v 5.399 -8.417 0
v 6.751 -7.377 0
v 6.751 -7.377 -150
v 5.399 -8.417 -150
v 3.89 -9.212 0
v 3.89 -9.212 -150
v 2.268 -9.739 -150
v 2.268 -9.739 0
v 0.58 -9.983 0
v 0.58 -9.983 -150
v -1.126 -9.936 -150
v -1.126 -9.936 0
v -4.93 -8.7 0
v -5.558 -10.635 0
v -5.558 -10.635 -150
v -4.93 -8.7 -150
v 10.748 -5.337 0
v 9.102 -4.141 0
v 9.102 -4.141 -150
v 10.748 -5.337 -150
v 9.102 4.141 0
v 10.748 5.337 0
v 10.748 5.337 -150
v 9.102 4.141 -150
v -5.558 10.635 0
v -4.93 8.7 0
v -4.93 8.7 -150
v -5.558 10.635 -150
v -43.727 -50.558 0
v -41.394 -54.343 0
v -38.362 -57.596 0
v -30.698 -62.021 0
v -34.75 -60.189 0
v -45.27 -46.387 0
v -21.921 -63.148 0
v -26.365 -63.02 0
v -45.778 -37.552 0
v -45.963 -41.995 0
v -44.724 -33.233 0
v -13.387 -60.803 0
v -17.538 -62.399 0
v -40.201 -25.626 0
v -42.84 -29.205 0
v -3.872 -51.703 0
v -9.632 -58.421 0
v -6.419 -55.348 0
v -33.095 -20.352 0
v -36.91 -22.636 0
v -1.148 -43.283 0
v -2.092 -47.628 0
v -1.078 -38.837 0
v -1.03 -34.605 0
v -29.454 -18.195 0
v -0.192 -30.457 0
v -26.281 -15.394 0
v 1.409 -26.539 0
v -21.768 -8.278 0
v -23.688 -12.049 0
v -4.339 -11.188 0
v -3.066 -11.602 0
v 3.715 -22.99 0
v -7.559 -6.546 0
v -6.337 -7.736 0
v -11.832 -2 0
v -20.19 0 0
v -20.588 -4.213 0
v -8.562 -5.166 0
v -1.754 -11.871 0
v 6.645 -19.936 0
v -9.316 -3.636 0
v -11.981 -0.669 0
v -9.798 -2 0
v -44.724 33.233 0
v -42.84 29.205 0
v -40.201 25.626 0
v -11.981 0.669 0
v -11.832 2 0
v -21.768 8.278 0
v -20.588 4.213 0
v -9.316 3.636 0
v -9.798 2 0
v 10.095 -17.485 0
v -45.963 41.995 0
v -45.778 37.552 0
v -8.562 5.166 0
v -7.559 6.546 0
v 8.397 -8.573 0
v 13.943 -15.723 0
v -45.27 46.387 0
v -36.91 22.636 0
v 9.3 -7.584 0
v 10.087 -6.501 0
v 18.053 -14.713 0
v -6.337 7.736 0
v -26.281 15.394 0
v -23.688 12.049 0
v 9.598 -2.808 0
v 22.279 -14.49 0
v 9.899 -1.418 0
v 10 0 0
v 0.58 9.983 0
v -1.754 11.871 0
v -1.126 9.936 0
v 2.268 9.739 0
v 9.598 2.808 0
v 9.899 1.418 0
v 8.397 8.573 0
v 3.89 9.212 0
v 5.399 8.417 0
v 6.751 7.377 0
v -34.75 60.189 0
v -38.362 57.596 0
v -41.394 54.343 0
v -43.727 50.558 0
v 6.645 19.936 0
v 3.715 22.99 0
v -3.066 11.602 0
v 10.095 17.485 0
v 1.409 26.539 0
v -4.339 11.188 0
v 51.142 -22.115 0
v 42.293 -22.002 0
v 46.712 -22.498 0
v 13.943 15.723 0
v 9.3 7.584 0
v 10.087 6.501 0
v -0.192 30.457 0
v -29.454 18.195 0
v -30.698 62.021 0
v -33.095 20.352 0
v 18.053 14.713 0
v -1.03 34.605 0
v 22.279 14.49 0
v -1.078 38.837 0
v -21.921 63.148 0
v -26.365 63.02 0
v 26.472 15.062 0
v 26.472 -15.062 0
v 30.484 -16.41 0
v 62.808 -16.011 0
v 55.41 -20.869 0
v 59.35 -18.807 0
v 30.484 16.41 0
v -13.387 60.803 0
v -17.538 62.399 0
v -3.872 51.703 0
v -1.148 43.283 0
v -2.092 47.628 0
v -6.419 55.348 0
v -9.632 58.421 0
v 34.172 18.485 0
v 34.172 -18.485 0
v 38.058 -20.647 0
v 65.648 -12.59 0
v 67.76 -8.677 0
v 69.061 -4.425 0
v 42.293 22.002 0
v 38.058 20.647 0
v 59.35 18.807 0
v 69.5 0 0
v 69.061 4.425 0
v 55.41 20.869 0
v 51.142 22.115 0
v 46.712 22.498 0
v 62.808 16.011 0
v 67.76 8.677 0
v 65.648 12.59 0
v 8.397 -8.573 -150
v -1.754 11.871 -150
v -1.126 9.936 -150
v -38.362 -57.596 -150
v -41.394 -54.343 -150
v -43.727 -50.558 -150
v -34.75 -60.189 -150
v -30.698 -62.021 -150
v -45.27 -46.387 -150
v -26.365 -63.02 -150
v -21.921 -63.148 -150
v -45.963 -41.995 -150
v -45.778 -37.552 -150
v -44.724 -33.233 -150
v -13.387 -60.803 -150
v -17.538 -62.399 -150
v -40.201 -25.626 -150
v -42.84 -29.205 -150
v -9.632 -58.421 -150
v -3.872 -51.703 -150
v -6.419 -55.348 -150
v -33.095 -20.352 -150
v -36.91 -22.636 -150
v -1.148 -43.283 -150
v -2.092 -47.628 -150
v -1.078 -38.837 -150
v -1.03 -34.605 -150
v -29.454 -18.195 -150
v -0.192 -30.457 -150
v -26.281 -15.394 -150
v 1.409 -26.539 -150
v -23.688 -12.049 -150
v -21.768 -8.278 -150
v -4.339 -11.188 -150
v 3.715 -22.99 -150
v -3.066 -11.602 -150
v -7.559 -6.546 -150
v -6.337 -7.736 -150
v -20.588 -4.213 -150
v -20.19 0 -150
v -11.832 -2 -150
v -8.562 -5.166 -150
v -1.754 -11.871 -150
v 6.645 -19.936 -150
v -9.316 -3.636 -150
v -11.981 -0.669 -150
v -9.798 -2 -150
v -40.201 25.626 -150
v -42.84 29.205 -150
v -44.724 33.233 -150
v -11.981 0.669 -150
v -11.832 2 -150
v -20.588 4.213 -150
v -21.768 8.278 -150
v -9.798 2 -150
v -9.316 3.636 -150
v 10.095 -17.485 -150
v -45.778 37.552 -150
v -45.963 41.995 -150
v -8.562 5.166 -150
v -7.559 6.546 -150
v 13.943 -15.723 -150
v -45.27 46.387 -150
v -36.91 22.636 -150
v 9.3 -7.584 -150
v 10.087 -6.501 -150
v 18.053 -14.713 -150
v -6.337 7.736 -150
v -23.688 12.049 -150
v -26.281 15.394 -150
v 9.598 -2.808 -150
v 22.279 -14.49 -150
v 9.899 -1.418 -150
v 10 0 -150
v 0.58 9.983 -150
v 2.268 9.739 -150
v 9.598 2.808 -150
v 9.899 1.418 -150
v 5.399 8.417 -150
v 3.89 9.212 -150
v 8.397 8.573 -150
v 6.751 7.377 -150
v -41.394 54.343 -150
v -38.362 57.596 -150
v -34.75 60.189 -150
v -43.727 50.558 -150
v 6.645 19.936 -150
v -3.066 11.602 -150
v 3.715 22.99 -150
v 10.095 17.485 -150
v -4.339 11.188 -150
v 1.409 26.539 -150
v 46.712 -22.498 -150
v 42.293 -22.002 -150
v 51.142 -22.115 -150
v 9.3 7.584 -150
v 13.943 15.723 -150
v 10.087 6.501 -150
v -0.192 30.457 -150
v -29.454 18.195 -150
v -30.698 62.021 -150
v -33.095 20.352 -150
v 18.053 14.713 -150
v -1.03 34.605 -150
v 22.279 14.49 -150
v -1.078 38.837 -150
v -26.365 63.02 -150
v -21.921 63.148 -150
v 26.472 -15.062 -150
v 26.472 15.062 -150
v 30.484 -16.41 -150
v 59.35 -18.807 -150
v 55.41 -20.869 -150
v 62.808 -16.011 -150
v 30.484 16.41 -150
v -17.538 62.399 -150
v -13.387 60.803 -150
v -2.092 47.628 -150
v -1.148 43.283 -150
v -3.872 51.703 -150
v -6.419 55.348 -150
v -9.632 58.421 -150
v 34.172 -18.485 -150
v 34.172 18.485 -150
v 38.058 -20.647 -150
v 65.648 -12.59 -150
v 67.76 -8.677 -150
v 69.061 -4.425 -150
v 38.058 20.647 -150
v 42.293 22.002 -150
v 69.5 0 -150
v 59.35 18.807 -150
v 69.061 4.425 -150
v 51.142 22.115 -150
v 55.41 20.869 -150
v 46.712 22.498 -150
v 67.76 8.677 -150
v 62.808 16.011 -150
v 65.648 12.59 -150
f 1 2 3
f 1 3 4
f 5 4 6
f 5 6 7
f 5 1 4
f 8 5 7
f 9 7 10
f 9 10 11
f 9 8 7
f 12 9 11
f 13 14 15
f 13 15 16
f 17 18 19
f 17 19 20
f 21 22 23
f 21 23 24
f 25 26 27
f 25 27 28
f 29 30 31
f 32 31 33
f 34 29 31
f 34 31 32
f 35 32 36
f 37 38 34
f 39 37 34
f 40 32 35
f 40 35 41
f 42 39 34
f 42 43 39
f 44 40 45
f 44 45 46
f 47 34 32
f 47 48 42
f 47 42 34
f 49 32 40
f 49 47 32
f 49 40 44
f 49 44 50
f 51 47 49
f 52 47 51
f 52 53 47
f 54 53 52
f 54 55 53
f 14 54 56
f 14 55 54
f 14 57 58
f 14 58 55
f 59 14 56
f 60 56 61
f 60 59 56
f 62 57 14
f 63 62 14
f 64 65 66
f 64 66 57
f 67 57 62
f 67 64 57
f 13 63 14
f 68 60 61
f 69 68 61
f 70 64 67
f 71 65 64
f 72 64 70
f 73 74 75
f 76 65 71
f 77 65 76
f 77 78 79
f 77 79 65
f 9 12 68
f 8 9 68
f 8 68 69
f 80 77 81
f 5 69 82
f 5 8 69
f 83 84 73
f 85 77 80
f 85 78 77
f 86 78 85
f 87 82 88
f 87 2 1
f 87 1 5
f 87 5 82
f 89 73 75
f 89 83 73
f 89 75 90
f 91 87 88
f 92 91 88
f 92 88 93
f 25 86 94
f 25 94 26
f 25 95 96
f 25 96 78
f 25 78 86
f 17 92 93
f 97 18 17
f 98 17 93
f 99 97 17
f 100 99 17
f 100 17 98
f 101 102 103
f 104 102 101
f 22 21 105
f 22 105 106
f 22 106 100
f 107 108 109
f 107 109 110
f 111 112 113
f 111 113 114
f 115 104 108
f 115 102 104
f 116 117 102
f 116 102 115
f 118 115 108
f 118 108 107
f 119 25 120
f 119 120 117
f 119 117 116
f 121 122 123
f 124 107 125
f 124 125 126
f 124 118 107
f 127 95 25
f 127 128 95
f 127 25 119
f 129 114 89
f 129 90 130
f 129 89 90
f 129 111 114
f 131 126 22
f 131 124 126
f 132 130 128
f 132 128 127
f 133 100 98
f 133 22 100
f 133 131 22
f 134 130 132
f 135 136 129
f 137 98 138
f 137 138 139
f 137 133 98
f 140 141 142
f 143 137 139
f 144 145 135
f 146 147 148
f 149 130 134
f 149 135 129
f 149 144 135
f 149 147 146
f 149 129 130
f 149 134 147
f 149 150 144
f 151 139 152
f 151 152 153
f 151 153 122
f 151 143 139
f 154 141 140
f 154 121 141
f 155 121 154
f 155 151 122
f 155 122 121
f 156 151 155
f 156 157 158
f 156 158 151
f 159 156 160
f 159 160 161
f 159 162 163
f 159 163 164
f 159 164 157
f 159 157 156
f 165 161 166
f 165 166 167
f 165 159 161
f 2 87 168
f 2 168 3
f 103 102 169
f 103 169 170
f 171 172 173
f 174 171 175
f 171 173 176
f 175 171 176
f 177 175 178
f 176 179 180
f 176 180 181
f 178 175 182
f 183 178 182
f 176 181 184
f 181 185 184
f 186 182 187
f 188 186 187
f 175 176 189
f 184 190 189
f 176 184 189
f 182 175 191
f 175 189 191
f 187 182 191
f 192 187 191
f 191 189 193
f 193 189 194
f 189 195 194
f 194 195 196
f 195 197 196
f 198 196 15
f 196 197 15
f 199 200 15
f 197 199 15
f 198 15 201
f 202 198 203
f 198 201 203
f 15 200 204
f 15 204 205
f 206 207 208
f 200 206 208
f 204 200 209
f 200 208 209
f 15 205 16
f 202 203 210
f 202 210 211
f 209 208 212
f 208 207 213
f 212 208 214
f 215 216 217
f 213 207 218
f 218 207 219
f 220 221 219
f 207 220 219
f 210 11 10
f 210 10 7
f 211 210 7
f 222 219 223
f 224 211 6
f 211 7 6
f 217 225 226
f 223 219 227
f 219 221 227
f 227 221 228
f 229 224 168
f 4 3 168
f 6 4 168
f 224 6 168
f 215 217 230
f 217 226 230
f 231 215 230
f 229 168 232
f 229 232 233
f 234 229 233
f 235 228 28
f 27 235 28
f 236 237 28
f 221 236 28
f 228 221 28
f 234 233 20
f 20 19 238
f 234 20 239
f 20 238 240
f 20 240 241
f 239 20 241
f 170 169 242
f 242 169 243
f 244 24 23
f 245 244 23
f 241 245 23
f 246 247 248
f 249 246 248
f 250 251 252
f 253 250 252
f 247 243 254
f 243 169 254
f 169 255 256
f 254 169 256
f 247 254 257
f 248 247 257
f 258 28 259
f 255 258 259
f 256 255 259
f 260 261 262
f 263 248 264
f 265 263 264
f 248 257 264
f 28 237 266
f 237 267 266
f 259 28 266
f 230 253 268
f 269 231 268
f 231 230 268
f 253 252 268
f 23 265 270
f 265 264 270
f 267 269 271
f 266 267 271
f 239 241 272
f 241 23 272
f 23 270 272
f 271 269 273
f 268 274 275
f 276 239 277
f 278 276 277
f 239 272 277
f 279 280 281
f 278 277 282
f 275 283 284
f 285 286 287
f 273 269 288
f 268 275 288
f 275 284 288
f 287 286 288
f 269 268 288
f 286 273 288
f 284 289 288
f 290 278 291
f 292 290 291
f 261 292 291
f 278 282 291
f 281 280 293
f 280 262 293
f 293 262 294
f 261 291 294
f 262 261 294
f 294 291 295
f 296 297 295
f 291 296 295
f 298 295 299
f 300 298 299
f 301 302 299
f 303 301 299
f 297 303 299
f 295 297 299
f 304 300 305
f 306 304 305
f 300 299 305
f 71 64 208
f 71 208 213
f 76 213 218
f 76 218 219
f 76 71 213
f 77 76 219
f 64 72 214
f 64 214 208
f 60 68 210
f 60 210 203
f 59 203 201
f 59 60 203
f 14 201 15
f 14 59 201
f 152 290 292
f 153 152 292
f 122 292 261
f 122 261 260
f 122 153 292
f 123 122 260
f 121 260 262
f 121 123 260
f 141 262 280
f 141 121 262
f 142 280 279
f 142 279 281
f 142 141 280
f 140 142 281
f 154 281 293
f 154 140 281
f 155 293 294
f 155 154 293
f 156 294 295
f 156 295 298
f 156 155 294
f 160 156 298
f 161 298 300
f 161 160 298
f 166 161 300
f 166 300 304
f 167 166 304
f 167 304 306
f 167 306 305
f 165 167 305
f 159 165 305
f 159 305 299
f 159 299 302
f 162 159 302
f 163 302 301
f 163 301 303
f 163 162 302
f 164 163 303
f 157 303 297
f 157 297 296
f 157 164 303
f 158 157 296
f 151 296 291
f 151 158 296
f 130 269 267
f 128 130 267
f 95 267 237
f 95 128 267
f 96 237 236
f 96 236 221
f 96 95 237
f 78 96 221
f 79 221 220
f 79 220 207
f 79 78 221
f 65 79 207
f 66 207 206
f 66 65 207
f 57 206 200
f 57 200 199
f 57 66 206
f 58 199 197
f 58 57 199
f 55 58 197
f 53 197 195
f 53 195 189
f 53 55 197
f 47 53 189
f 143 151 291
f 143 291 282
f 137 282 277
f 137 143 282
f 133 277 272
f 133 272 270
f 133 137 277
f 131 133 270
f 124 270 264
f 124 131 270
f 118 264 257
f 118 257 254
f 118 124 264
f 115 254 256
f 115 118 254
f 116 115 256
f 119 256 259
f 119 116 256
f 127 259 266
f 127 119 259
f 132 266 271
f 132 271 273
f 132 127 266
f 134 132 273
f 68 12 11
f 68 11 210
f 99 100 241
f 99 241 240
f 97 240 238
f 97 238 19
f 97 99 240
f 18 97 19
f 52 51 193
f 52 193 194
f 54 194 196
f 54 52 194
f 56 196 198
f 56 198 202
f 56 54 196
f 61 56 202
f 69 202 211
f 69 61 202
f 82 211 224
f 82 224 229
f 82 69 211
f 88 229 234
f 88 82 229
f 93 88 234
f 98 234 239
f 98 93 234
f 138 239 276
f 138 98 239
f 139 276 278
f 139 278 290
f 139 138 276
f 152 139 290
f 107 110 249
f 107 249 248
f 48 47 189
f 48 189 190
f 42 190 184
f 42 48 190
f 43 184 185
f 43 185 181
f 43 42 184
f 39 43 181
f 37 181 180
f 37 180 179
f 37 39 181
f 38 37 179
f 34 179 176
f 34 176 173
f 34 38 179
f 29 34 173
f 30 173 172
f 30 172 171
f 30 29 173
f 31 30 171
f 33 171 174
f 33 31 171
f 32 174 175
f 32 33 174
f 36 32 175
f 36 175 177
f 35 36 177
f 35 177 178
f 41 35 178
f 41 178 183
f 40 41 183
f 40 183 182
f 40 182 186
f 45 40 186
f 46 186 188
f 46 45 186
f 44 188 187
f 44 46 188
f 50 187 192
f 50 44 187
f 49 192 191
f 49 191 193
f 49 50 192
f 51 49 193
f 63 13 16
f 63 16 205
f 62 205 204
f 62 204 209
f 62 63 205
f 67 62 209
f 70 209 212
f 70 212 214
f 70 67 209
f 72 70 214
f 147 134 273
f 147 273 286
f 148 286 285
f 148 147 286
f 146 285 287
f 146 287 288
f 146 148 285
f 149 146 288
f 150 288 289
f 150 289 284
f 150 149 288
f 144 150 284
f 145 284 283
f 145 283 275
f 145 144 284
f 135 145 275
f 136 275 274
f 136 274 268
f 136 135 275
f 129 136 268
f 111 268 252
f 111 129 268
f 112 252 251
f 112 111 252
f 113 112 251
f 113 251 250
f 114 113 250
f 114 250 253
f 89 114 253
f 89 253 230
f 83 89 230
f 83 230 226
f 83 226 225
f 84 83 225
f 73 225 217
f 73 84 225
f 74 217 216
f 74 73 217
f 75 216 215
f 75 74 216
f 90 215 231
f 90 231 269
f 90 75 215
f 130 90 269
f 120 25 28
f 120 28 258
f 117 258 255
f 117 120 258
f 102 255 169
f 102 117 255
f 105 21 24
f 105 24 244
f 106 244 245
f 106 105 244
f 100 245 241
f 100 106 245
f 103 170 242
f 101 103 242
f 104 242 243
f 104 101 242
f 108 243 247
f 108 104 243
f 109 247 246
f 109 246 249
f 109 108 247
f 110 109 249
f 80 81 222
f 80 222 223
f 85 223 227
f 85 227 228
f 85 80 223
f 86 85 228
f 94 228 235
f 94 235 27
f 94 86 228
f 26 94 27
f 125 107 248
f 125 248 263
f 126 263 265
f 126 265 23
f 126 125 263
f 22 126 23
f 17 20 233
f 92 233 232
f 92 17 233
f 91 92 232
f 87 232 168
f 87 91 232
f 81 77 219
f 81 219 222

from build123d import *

# Parameters (mm, degrees)
Y_KSEKLIK_EKSTR_ZYON1_DEPTH = 150


with BuildPart() as part:
    # Çizim1 → Yükseklik-Ekstrüzyon1 (new body)
    with BuildSketch(Plane.XY):
        with BuildLine():
            ThreePointArc((-1.077539734, -38.836840411), (10.094920531, -17.484915258), (34.172460266, -18.485243422))
            ThreePointArc((34.172460266, -18.485243422), (69.5, 0), (34.172460266, 18.485243422))
            ThreePointArc((34.172460266, 18.485243422), (10.094920531, 17.484915258), (-1.077539734, 38.836840411))
            ThreePointArc((-1.077539734, 38.836840411), (-34.75, 60.188765563), (-33.094920531, 20.351596989))
            ThreePointArc((-33.094920531, 20.351596989), (-20.189841062, 0), (-33.094920531, -20.351596989))
            ThreePointArc((-33.094920531, -20.351596989), (-34.75, -60.188765563), (-1.077539734, -38.836840411))
        make_face()
        with BuildLine():
            ThreePointArc((-5.558451419, 10.635018469), (-3.708203932, 11.412678196), (-1.754225354, 11.871086446))
            Line((-1.754225354, 11.871086446), (-1.1256228, 9.936446715))
            ThreePointArc((-1.1256228, 9.936446715), (3.090169944, 9.510565163), (6.751144813, 7.377129775))
            Line((6.751144813, 7.377129775), (8.396847665, 8.572802885))
            ThreePointArc((8.396847665, 8.572802885), (9.708203932, 7.053423028), (10.747988674, 5.336734907))
            Line((10.747988674, 5.336734907), (9.102285822, 4.141061797))
            ThreePointArc((9.102285822, 4.141061797), (9.77299489, 2.118624763), (10, 0))
            ThreePointArc((10, 0), (9.77299489, -2.118624763), (9.102285822, -4.141061797))
            Line((9.102285822, -4.141061797), (10.747988674, -5.336734907))
            ThreePointArc((10.747988674, -5.336734907), (9.708203932, -7.053423028), (8.396847665, -8.572802885))
            Line((8.396847665, -8.572802885), (6.751144813, -7.377129775))
            ThreePointArc((6.751144813, -7.377129775), (3.090169944, -9.510565163), (-1.1256228, -9.936446715))
            Line((-1.1256228, -9.936446715), (-1.754225354, -11.871086446))
            ThreePointArc((-1.754225354, -11.871086446), (-3.708203932, -11.412678196), (-5.558451419, -10.635018469))
            Line((-5.558451419, -10.635018469), (-4.929848865, -8.700378737))
            ThreePointArc((-4.929848865, -8.700378737), (-8.090169944, -5.877852523), (-9.797958971, -2))
            Line((-9.797958971, -2), (-11.832159566, -2))
            ThreePointArc((-11.832159566, -2), (-12, 0), (-11.832159566, 2))
            Line((-11.832159566, 2), (-9.797958971, 2))
            ThreePointArc((-9.797958971, 2), (-8.090169944, 5.877852523), (-4.929848865, 8.700378737))
            Line((-4.929848865, 8.700378737), (-5.558451419, 10.635018469))
        make_face(mode=Mode.SUBTRACT)
    extrude(amount=-Y_KSEKLIK_EKSTR_ZYON1_DEPTH)


solid = part.part
